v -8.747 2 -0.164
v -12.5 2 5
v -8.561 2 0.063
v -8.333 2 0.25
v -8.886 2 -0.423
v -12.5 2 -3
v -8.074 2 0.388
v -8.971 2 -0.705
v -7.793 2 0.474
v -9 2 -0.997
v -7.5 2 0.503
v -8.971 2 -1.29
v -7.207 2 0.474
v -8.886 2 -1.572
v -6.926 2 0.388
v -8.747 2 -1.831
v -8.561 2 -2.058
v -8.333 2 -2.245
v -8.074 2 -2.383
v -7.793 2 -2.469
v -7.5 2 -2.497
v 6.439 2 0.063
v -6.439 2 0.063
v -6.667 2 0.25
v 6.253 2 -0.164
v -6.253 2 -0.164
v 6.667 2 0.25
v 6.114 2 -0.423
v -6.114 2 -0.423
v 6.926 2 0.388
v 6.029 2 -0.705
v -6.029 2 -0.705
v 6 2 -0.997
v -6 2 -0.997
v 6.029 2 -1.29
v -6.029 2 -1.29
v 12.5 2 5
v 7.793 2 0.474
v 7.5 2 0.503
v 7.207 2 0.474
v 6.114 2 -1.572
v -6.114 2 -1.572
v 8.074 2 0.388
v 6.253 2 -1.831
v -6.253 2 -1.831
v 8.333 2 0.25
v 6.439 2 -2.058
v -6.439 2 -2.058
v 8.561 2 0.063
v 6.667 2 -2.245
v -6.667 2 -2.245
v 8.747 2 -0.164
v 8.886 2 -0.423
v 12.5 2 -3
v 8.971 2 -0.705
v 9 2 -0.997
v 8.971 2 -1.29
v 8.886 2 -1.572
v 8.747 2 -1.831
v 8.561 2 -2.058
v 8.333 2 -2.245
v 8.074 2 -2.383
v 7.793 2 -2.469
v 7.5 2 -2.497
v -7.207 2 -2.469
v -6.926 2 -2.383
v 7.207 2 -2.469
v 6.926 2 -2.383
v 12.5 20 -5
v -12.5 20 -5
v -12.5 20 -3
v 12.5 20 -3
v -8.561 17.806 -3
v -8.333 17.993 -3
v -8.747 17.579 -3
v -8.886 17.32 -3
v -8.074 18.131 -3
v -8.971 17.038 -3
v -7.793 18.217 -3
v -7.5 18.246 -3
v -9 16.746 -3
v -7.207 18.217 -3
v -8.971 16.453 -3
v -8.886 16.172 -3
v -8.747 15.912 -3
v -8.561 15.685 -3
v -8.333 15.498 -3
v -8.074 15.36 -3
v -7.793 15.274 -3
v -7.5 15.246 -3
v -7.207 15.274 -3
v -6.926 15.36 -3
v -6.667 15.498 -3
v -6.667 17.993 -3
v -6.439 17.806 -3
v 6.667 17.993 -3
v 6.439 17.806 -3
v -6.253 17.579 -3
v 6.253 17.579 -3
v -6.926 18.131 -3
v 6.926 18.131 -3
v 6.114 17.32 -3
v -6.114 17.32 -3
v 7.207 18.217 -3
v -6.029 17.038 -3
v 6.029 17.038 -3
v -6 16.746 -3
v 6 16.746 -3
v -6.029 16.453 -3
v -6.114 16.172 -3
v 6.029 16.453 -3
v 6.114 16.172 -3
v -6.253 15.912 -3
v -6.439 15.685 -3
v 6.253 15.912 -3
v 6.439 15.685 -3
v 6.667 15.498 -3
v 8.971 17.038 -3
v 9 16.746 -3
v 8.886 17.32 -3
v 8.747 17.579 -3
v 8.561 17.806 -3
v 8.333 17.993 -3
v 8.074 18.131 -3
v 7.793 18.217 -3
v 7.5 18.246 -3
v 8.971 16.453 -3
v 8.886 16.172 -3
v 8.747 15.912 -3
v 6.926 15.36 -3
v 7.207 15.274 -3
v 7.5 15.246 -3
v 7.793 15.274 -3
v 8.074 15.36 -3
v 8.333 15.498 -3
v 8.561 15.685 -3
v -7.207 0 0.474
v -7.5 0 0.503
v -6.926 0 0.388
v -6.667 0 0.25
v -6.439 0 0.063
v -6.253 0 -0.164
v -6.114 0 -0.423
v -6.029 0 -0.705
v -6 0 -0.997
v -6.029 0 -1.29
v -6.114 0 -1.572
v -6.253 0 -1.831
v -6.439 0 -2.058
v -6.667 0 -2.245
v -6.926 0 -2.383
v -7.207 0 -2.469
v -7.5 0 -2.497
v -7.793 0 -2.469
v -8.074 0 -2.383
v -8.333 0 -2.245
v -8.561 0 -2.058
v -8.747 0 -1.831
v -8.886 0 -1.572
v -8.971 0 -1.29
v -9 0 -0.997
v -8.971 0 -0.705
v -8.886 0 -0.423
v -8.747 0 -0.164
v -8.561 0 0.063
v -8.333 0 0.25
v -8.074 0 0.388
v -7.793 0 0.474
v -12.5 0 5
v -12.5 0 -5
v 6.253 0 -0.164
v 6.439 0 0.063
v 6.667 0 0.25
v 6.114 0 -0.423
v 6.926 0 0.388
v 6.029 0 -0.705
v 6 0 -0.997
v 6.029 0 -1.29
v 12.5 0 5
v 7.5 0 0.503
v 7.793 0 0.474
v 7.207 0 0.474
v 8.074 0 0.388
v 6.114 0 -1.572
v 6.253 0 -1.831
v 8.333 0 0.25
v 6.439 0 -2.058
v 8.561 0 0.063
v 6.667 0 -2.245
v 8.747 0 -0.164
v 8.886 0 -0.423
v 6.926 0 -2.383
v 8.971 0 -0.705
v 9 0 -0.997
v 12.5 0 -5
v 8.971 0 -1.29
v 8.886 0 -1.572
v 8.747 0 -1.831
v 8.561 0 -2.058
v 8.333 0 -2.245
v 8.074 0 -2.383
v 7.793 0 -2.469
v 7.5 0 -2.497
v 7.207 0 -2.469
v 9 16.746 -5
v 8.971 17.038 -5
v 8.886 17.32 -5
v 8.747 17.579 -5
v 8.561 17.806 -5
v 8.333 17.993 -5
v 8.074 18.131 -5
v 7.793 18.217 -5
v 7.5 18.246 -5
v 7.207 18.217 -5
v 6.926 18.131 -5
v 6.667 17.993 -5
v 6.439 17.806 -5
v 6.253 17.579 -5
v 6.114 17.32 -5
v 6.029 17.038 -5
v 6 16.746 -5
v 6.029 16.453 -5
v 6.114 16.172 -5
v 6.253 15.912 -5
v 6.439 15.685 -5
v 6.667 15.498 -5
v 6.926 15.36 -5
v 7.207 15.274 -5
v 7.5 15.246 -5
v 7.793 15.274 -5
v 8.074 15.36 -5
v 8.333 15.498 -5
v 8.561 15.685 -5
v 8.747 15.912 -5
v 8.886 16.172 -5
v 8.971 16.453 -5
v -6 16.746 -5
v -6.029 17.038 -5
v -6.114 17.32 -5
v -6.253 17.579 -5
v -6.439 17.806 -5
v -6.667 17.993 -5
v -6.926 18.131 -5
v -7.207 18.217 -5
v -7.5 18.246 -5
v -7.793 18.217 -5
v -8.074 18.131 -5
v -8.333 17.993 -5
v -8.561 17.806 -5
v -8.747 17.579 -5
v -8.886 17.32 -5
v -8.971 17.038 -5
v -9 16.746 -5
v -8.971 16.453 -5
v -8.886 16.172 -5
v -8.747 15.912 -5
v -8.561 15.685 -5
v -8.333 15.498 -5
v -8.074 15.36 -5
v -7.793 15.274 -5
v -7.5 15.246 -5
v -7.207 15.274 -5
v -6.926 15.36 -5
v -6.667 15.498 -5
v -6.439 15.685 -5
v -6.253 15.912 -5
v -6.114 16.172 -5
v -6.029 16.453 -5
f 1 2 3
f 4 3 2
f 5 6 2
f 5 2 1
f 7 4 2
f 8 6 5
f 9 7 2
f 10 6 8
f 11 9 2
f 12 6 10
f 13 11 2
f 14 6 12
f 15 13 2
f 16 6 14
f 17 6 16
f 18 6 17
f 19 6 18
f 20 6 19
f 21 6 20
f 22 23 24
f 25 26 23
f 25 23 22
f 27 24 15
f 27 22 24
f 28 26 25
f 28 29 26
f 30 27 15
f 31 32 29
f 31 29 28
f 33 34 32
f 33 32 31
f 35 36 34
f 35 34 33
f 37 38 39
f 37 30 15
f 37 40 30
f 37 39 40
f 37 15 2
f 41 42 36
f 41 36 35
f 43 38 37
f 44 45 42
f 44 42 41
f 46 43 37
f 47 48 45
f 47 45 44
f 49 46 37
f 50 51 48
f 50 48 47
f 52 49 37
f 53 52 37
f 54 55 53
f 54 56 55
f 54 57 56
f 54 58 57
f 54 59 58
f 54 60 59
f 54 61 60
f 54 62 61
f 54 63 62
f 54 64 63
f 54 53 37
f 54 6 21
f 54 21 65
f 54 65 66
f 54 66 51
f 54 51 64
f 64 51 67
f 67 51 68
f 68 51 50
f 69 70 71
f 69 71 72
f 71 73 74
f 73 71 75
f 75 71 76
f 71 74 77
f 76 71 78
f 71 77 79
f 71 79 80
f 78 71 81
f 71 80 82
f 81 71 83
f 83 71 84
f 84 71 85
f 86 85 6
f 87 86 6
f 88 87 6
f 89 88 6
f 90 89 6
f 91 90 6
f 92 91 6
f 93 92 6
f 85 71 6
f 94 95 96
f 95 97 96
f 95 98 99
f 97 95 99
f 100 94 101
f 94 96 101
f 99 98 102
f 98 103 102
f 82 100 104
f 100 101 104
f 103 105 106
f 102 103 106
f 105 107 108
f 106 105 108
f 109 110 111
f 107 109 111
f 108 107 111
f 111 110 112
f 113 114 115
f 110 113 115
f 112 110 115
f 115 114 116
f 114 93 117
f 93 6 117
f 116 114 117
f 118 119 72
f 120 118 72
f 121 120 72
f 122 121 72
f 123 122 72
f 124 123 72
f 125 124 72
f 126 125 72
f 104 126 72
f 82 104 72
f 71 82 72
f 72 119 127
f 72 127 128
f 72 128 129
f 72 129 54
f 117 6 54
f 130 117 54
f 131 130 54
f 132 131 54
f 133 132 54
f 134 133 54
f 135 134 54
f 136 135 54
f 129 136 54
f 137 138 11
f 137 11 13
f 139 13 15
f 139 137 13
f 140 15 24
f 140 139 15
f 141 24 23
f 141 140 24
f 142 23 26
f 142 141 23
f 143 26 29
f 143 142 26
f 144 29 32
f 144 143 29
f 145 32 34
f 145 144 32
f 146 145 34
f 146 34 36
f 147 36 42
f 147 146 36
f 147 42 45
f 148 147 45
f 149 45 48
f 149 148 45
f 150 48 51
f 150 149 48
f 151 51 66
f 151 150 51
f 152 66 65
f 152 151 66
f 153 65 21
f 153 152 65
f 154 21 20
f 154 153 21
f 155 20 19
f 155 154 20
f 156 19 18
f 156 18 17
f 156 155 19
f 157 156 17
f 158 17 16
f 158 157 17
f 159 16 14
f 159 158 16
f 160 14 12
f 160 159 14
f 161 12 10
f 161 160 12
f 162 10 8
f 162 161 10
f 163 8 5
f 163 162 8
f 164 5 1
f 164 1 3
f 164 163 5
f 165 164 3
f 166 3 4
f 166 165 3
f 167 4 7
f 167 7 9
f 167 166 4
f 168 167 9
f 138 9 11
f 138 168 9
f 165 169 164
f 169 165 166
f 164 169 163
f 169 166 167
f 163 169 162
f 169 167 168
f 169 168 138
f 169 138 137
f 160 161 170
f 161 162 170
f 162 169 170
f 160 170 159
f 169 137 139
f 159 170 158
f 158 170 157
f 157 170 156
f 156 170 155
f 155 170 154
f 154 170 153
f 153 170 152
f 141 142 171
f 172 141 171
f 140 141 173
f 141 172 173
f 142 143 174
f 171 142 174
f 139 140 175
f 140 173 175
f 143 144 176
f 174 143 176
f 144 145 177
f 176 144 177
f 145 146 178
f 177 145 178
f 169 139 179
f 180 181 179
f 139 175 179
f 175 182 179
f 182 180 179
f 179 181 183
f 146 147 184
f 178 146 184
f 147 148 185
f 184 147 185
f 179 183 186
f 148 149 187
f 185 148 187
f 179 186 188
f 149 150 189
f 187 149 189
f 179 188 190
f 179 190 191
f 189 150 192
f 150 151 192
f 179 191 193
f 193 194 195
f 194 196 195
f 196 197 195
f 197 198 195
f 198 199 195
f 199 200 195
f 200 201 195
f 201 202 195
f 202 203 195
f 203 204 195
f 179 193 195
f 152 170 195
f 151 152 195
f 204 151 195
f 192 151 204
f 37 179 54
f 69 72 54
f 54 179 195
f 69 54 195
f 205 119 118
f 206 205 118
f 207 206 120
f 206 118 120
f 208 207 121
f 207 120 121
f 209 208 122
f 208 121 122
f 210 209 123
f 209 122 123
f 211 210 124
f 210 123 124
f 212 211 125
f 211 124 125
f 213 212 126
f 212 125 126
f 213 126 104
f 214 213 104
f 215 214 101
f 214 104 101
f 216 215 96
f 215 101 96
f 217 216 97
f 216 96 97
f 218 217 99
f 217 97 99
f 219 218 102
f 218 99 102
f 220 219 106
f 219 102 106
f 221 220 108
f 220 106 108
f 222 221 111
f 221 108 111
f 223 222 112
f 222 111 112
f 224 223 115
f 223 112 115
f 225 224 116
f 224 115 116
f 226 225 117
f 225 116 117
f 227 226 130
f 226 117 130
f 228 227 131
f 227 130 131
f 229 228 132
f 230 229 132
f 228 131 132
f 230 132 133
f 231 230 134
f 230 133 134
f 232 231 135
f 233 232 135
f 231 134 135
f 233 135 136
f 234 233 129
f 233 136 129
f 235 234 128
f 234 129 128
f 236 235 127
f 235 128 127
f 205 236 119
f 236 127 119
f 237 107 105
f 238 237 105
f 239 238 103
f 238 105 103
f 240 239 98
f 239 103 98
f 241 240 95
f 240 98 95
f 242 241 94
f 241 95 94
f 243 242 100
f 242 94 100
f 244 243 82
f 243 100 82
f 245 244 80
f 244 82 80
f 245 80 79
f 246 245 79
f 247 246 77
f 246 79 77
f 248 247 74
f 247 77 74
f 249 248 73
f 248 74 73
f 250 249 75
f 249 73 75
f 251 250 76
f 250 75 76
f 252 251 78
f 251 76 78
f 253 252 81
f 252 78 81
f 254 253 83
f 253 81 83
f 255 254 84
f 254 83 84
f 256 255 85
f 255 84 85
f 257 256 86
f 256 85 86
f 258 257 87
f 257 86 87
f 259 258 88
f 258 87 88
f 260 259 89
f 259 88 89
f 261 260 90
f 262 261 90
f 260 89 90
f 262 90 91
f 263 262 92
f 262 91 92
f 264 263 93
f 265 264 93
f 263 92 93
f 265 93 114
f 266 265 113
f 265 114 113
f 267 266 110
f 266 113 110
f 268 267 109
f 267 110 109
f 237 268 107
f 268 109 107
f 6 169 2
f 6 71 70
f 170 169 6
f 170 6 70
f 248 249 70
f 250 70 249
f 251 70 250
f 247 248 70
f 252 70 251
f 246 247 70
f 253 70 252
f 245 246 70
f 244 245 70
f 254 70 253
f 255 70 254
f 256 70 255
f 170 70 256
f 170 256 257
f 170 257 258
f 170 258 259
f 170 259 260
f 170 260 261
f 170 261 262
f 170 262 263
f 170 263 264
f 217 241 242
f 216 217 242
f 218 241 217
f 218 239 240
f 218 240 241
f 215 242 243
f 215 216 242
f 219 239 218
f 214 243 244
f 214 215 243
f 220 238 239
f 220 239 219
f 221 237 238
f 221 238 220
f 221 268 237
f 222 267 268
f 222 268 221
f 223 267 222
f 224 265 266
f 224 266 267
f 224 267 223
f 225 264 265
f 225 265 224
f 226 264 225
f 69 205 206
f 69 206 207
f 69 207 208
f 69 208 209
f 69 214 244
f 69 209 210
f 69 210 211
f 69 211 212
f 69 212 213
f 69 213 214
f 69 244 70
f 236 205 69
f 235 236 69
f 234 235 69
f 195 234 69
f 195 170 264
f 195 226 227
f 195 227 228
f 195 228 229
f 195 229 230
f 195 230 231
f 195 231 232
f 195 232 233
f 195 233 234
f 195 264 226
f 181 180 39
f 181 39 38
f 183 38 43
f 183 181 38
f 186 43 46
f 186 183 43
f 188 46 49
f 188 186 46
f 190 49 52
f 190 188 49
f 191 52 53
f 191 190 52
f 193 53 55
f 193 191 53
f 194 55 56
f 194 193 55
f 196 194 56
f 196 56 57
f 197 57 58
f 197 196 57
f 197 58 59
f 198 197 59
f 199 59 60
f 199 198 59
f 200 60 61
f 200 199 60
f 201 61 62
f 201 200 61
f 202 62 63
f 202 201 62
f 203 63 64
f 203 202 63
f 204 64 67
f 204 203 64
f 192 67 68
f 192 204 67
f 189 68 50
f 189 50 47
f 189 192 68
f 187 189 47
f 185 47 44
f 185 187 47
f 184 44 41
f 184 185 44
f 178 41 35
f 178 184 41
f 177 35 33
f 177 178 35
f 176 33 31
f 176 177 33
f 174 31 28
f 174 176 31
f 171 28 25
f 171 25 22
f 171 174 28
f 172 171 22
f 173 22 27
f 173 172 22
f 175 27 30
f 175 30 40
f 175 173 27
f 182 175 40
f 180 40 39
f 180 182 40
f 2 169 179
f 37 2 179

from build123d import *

# Parameters (mm, degrees)
SKETCH_1_W          = 25
SKETCH_1_H          = 2
EXTRUDE_1_DEPTH     = 20
EXTRUDE_2_DEPTH     = 2
SKETCH_2_R          = 1.5
CUT_EXTRUDE_1_DEPTH = 2


with BuildPart() as part:
    # 草图1 → 凸台-拉伸1 (new body)
    with BuildSketch(Plane(origin=(0, 0, 0), x_dir=(1, 0, 0), z_dir=(0, 1, 0))):
        with Locations((0, 4)):
            Rectangle(SKETCH_1_W, SKETCH_1_H)
    extrude(amount=EXTRUDE_1_DEPTH)

    # 草图1<3> → 凸台-拉伸2 (add)
    with BuildSketch(Plane(origin=(0, 0, 0), x_dir=(1, 0, 0), z_dir=(0, 1, 0))):
        Polygon((12.5, 3), (-12.5, 3), (-12.5, -5), (-7.5, -5), (0, -5), (7.5, -5), (12.5, -5), align=None)
        with BuildLine():
            ThreePointArc((-6, 0.997487313), (-6.439339828, -0.063172859), (-7.5, -0.502512687))
            ThreePointArc((-7.5, -0.502512687), (-8.560660172, 2.058147484), (-6, 0.997487313))
        make_face(mode=Mode.SUBTRACT)
        with BuildLine():
            ThreePointArc((9, 0.997487313), (7.5, -0.502512687), (6, 0.997487313))
            ThreePointArc((6, 0.997487313), (7.5, 2.497487313), (9, 0.997487313))
        make_face(mode=Mode.SUBTRACT)
    extrude(amount=EXTRUDE_2_DEPTH)

    # 草图2 → 切除-拉伸1 (cut)
    with BuildSketch(Plane.XY.offset(-3)):
        with Locations((7.5, 16.745611825)):
            Circle(SKETCH_2_R)
        with Locations((-7.5, 16.745611825)):
            Circle(SKETCH_2_R)
    extrude(amount=-CUT_EXTRUDE_1_DEPTH, mode=Mode.SUBTRACT)


solid = part.part
